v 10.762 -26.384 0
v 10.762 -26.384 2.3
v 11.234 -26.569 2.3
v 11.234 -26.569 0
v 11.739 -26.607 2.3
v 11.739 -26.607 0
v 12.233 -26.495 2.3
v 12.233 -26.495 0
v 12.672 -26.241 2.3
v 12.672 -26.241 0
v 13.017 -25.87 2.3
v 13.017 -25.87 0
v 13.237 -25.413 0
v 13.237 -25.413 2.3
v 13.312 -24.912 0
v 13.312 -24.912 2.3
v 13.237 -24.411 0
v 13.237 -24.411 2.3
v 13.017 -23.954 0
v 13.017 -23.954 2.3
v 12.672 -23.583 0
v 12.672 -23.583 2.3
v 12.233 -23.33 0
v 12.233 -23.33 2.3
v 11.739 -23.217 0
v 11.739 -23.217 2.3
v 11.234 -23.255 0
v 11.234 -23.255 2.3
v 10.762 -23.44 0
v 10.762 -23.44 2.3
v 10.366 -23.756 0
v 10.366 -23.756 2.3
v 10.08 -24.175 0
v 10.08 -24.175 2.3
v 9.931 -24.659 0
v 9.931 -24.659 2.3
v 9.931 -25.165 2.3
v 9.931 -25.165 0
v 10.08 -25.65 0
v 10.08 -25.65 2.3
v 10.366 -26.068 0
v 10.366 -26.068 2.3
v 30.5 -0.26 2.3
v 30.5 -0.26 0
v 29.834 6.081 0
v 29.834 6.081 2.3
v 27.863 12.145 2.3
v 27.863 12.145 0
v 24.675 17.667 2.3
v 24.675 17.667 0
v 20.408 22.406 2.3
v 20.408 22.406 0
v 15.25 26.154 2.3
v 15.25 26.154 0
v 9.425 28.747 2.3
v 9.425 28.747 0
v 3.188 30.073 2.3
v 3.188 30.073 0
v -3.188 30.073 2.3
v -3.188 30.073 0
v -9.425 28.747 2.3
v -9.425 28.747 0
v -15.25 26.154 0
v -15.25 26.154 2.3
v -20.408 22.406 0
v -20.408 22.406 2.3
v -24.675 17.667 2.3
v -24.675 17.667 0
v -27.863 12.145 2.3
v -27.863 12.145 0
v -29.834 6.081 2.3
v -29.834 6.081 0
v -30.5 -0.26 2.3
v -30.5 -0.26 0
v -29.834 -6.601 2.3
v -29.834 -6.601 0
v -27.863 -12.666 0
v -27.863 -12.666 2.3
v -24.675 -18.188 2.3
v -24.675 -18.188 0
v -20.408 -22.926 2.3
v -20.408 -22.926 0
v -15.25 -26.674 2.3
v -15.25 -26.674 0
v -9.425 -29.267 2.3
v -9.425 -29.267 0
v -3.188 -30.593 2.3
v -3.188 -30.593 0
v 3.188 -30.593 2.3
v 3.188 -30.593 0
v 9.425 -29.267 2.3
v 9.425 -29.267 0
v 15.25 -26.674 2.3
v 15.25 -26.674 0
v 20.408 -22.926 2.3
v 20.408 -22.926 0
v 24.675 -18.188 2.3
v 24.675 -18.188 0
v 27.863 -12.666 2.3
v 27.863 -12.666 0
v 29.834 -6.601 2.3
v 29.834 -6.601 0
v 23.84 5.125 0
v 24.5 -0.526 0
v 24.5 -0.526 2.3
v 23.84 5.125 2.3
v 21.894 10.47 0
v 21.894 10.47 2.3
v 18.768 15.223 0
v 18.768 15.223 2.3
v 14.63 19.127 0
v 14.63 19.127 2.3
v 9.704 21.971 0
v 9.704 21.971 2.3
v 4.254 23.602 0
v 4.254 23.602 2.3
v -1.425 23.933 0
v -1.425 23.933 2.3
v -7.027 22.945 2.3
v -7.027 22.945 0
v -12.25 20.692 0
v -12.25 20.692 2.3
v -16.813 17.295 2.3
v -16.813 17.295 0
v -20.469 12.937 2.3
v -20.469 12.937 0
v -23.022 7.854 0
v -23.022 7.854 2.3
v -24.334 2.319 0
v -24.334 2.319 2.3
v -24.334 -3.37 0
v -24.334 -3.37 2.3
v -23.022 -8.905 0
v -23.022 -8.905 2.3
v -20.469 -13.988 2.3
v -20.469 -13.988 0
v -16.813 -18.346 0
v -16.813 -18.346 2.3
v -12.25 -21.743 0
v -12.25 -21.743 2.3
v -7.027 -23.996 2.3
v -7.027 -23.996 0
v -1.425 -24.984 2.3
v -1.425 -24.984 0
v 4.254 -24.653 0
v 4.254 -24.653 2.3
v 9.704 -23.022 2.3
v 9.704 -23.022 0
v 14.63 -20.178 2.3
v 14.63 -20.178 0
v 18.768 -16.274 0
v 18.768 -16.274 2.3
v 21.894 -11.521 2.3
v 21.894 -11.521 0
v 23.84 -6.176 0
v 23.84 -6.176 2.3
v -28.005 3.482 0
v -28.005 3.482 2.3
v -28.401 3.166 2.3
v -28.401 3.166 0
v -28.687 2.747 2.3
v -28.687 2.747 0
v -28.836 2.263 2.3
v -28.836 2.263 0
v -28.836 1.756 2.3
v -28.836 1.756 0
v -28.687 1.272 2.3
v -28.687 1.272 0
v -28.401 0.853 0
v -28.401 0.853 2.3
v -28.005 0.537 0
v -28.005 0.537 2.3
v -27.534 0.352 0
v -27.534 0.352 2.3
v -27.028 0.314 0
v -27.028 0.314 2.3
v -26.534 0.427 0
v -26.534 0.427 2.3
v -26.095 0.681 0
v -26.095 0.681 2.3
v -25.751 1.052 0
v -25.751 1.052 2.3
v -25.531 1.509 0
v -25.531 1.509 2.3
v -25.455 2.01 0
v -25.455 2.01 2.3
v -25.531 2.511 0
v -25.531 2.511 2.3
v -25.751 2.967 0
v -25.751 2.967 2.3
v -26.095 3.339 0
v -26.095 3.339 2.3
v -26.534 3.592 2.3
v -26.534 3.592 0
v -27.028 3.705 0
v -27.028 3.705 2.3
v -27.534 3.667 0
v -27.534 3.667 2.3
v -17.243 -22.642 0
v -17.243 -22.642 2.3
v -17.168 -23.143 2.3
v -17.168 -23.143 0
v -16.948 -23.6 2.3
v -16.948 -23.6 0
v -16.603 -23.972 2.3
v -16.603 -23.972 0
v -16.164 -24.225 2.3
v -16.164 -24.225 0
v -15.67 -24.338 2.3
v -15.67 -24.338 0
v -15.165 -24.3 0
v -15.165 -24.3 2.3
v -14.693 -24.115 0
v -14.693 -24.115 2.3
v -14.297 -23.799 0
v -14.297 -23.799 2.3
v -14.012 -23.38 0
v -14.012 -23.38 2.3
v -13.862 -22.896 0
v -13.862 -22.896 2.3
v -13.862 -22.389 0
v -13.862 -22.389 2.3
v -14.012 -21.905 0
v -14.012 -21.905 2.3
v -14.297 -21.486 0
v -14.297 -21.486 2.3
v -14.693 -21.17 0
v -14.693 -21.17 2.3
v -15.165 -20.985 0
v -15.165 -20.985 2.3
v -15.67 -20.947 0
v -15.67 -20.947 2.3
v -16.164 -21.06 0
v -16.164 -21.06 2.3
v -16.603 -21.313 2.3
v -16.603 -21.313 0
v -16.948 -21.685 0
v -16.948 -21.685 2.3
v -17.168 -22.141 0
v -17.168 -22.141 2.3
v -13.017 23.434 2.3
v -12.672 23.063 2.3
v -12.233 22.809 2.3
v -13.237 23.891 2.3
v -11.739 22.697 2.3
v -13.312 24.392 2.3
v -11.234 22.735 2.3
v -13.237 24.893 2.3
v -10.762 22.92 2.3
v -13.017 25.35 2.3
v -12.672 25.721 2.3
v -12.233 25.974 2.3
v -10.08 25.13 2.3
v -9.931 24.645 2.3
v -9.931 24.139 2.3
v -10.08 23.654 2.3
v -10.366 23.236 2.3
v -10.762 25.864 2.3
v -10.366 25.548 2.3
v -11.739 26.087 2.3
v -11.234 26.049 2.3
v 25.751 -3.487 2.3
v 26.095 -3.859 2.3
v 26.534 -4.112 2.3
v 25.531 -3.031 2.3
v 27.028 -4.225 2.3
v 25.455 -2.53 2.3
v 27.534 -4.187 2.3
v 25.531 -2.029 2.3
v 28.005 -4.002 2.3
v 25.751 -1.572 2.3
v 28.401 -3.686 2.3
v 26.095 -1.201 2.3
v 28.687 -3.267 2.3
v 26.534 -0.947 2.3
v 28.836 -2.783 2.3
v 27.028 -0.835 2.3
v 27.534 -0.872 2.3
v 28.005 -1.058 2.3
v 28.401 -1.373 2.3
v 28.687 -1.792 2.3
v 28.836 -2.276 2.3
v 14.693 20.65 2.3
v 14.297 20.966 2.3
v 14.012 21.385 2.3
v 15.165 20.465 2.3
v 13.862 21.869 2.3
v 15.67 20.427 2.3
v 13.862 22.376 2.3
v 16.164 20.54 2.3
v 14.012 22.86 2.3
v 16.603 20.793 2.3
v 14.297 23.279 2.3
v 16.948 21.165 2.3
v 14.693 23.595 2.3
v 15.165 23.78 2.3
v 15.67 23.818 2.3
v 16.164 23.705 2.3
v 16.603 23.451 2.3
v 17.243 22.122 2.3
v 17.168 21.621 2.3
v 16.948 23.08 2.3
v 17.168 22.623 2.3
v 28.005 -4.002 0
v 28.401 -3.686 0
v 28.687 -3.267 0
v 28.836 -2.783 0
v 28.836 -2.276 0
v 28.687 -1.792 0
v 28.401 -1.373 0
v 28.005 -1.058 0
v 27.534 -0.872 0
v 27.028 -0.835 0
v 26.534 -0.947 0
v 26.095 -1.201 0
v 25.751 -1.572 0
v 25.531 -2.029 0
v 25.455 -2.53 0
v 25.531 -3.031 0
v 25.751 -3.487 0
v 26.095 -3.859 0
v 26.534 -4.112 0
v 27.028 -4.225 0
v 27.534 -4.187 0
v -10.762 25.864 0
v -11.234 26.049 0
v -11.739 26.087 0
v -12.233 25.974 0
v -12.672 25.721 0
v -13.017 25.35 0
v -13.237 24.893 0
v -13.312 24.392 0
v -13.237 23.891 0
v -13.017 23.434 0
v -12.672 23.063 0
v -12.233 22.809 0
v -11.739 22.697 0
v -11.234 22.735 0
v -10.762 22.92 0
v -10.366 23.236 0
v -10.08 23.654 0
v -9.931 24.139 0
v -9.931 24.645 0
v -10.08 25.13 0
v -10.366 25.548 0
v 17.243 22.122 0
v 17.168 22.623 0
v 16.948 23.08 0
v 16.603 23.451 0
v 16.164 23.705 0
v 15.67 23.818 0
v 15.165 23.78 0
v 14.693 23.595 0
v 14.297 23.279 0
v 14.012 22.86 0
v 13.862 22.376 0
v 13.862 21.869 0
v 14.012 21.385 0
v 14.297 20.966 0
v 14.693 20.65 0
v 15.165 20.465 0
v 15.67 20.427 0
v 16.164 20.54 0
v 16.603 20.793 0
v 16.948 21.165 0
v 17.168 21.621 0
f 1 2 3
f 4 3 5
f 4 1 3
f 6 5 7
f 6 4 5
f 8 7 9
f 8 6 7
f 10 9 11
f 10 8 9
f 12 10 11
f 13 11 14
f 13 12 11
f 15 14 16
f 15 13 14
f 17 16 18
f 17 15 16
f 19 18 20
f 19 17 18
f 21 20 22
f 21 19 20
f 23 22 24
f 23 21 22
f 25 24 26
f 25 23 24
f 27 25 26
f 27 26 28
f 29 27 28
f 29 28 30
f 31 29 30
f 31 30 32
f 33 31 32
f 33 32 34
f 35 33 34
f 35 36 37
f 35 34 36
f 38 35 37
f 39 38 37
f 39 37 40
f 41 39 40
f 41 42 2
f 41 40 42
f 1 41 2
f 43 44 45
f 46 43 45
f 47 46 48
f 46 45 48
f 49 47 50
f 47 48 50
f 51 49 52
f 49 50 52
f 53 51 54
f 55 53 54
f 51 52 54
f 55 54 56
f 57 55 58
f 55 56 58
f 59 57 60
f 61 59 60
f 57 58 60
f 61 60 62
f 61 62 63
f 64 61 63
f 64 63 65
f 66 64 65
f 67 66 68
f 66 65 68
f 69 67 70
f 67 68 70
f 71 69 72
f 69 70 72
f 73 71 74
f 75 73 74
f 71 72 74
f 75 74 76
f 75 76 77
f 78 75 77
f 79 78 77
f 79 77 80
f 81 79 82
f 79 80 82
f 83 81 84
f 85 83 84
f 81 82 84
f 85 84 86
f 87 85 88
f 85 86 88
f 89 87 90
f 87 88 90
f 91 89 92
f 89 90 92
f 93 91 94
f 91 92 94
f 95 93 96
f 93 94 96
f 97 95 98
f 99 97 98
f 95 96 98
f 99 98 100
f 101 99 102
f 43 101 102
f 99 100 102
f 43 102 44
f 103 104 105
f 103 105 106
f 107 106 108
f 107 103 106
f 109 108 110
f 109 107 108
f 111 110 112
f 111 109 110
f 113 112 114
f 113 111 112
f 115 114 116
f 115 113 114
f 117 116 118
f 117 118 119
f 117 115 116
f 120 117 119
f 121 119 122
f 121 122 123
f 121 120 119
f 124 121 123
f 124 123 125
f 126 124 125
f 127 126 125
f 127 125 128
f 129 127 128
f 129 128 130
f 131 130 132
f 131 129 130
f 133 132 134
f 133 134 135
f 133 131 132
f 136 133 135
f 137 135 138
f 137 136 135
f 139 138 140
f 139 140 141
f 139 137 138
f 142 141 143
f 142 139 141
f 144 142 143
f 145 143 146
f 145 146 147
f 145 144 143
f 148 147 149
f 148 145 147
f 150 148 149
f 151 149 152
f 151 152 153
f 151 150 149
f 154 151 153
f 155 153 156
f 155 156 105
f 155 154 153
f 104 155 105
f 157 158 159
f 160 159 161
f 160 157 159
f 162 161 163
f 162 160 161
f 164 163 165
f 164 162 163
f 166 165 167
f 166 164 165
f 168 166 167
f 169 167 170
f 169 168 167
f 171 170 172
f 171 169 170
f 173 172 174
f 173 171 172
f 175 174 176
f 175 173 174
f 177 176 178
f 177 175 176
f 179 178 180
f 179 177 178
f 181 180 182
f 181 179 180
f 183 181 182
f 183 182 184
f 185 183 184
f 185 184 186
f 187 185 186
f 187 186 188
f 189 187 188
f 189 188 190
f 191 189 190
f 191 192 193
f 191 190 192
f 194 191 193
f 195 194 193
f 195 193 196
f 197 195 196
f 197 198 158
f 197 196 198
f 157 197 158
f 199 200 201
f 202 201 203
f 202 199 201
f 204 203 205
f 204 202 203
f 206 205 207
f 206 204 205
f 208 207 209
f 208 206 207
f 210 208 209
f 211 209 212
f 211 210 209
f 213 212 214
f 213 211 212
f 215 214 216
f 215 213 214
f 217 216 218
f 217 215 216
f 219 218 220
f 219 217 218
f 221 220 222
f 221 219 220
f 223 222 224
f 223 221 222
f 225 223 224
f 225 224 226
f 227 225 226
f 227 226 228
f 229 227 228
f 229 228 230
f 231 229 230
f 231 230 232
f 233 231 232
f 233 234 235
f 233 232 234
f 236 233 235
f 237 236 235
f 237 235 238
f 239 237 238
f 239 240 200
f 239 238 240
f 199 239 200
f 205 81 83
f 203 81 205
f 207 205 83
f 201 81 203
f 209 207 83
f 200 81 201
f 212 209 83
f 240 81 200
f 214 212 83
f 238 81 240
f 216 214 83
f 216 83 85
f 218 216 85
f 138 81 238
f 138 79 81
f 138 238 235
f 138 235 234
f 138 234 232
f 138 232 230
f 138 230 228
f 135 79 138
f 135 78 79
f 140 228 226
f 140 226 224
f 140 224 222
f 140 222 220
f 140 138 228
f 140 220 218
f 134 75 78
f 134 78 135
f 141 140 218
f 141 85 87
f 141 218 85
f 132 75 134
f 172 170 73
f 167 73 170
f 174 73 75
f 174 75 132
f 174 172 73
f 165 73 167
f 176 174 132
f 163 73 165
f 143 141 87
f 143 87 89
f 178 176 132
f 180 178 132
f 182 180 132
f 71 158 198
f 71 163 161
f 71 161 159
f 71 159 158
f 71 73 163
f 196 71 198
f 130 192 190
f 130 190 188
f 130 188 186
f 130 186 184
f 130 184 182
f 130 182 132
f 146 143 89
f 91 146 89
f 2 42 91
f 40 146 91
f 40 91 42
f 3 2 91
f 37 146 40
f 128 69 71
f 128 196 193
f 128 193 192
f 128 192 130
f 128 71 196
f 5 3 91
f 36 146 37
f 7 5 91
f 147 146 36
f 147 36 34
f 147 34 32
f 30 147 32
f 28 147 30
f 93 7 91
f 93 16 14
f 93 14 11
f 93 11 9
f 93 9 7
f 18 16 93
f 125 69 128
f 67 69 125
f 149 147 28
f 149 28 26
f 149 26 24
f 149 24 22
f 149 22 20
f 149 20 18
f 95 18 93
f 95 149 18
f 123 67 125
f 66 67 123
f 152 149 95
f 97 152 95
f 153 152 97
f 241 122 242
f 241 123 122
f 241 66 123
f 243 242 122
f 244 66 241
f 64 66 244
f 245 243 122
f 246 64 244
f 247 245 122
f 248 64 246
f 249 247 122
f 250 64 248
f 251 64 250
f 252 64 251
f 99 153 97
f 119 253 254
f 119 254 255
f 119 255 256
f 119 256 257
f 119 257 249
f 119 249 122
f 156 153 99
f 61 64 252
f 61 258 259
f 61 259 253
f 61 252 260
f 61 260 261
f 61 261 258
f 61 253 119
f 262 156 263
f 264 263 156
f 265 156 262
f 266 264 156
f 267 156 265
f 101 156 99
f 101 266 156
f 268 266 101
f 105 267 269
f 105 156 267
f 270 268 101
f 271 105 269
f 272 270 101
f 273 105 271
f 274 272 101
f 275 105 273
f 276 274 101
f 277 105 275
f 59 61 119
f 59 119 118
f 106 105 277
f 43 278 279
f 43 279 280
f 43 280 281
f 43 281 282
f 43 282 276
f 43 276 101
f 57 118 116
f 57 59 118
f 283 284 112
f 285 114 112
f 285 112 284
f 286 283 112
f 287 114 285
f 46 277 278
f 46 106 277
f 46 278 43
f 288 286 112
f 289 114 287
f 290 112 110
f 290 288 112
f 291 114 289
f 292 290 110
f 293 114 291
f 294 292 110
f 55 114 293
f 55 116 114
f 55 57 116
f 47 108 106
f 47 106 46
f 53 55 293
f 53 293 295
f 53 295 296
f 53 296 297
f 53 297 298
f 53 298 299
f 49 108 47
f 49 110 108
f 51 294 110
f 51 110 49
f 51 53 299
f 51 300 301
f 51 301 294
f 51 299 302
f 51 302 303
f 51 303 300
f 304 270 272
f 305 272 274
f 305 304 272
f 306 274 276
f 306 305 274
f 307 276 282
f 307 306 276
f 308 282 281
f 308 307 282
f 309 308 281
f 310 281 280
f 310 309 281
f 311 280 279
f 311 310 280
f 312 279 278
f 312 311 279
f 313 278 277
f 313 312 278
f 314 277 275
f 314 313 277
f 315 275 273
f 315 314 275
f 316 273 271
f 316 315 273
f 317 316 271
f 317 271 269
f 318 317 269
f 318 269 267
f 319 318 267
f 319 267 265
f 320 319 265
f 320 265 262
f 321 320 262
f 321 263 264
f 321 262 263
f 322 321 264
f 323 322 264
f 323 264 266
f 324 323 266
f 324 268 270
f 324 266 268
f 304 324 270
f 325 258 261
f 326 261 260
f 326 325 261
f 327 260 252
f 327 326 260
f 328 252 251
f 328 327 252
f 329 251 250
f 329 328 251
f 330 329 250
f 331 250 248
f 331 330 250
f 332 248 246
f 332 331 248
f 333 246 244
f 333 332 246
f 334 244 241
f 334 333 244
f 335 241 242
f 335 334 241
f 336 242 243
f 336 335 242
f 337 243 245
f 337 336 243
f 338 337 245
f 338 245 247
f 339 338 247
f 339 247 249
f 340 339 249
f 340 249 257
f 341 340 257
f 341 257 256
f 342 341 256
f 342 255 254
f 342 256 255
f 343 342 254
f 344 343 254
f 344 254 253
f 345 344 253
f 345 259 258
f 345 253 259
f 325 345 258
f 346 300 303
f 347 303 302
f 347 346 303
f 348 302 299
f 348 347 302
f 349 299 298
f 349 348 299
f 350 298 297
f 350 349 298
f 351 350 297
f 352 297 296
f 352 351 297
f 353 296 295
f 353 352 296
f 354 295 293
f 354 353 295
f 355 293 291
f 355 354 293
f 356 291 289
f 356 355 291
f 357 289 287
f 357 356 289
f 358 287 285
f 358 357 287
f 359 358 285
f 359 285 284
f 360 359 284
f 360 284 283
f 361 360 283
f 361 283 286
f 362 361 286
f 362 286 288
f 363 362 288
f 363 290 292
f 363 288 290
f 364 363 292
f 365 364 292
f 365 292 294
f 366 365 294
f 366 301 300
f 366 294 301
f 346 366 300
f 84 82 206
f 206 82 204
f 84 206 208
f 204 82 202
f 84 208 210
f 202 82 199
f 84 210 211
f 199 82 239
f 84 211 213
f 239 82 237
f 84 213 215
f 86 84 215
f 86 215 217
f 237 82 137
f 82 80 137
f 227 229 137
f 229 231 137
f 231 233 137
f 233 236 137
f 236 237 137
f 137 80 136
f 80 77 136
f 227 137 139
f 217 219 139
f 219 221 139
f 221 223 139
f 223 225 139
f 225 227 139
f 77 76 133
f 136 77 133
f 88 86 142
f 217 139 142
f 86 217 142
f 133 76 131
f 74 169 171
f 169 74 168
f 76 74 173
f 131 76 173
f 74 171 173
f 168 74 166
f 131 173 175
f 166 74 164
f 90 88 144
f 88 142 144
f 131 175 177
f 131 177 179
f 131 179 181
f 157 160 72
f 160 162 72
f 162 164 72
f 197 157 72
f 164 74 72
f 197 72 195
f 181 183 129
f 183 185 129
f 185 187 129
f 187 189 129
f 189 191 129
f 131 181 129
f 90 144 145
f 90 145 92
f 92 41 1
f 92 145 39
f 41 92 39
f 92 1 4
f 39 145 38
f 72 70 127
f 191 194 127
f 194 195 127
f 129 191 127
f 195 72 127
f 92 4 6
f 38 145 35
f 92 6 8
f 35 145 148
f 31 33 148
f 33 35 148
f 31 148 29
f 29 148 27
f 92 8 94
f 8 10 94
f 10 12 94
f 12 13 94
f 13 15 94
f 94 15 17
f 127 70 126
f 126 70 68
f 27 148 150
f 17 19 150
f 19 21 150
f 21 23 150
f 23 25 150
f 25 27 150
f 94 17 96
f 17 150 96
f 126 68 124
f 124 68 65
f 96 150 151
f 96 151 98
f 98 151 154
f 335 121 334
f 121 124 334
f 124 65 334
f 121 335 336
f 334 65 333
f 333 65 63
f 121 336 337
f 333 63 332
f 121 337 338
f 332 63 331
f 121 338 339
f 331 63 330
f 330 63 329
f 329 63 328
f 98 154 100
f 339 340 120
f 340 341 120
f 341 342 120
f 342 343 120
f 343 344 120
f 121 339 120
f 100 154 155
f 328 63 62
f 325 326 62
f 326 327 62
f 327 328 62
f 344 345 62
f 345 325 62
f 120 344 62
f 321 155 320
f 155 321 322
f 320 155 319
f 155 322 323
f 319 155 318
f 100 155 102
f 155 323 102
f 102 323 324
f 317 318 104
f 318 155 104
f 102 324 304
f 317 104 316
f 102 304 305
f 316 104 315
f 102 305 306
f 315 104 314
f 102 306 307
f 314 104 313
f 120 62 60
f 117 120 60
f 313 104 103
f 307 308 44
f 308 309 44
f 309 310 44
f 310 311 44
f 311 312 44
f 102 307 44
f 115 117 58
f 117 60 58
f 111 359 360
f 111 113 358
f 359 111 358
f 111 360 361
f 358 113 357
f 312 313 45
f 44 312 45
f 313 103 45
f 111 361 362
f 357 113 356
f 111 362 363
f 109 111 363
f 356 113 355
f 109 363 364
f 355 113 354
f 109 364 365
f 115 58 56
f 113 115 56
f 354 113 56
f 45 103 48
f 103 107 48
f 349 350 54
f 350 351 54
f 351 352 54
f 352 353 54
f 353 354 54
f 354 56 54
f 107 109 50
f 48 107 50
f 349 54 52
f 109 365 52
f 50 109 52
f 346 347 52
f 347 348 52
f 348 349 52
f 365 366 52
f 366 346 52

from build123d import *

# Parameters (mm, degrees)
ESQUISSE1_R                  = 30.5
ESQUISSE1_R_2                = 24.5
BOSS_EXTRU_1_DEPTH           = 2.3
ENL_V_MAT_EXTRU_2_REACH      = 45.379
ESQUISSE1_3_R                = 1.7
R_P_TITION_CIRCULAIRE1_COUNT = 6


with BuildPart() as part:
    # Esquisse1 → Boss.-Extru.1 (new body)
    with BuildSketch(Plane.XY):
        with Locations((0, -0.260069897)):
            Circle(ESQUISSE1_R)
        with Locations((0, -0.525514899)):
            Circle(ESQUISSE1_R_2, mode=Mode.SUBTRACT)
    extrude(amount=BOSS_EXTRU_1_DEPTH)

    # Esquisse1<3> → Enlèv. mat.-Extru.2 (cut, up to next)
    with BuildSketch(Plane.XY, mode=Mode.PRIVATE) as enl_v_mat_extru_2_sk1:
        with Locations((15.543281325, 22.122264781)):
            Circle(ESQUISSE1_3_R)
    enl_v_mat_extru_2_tool1 = extrude(enl_v_mat_extru_2_sk1.sketch, amount=ENL_V_MAT_EXTRU_2_REACH, mode=Mode.PRIVATE) & part.part
    enl_v_mat_extru_2 = enl_v_mat_extru_2_tool1.solids().sort_by_distance((15.543281, 22.122265, 0))[0]
    add(enl_v_mat_extru_2, mode=Mode.SUBTRACT)

    # Répétition circulaire1: Enlèv. mat.-Extru.2 ×6 about axis
    r_p_tition_circulaire1_axis = Axis((0, -0.260069897, 2.3), (0, 0, -1))
    for i in range(1, R_P_TITION_CIRCULAIRE1_COUNT):
        add(enl_v_mat_extru_2.rotate(r_p_tition_circulaire1_axis, i * 360 / R_P_TITION_CIRCULAIRE1_COUNT), mode=Mode.SUBTRACT)


solid = part.part
